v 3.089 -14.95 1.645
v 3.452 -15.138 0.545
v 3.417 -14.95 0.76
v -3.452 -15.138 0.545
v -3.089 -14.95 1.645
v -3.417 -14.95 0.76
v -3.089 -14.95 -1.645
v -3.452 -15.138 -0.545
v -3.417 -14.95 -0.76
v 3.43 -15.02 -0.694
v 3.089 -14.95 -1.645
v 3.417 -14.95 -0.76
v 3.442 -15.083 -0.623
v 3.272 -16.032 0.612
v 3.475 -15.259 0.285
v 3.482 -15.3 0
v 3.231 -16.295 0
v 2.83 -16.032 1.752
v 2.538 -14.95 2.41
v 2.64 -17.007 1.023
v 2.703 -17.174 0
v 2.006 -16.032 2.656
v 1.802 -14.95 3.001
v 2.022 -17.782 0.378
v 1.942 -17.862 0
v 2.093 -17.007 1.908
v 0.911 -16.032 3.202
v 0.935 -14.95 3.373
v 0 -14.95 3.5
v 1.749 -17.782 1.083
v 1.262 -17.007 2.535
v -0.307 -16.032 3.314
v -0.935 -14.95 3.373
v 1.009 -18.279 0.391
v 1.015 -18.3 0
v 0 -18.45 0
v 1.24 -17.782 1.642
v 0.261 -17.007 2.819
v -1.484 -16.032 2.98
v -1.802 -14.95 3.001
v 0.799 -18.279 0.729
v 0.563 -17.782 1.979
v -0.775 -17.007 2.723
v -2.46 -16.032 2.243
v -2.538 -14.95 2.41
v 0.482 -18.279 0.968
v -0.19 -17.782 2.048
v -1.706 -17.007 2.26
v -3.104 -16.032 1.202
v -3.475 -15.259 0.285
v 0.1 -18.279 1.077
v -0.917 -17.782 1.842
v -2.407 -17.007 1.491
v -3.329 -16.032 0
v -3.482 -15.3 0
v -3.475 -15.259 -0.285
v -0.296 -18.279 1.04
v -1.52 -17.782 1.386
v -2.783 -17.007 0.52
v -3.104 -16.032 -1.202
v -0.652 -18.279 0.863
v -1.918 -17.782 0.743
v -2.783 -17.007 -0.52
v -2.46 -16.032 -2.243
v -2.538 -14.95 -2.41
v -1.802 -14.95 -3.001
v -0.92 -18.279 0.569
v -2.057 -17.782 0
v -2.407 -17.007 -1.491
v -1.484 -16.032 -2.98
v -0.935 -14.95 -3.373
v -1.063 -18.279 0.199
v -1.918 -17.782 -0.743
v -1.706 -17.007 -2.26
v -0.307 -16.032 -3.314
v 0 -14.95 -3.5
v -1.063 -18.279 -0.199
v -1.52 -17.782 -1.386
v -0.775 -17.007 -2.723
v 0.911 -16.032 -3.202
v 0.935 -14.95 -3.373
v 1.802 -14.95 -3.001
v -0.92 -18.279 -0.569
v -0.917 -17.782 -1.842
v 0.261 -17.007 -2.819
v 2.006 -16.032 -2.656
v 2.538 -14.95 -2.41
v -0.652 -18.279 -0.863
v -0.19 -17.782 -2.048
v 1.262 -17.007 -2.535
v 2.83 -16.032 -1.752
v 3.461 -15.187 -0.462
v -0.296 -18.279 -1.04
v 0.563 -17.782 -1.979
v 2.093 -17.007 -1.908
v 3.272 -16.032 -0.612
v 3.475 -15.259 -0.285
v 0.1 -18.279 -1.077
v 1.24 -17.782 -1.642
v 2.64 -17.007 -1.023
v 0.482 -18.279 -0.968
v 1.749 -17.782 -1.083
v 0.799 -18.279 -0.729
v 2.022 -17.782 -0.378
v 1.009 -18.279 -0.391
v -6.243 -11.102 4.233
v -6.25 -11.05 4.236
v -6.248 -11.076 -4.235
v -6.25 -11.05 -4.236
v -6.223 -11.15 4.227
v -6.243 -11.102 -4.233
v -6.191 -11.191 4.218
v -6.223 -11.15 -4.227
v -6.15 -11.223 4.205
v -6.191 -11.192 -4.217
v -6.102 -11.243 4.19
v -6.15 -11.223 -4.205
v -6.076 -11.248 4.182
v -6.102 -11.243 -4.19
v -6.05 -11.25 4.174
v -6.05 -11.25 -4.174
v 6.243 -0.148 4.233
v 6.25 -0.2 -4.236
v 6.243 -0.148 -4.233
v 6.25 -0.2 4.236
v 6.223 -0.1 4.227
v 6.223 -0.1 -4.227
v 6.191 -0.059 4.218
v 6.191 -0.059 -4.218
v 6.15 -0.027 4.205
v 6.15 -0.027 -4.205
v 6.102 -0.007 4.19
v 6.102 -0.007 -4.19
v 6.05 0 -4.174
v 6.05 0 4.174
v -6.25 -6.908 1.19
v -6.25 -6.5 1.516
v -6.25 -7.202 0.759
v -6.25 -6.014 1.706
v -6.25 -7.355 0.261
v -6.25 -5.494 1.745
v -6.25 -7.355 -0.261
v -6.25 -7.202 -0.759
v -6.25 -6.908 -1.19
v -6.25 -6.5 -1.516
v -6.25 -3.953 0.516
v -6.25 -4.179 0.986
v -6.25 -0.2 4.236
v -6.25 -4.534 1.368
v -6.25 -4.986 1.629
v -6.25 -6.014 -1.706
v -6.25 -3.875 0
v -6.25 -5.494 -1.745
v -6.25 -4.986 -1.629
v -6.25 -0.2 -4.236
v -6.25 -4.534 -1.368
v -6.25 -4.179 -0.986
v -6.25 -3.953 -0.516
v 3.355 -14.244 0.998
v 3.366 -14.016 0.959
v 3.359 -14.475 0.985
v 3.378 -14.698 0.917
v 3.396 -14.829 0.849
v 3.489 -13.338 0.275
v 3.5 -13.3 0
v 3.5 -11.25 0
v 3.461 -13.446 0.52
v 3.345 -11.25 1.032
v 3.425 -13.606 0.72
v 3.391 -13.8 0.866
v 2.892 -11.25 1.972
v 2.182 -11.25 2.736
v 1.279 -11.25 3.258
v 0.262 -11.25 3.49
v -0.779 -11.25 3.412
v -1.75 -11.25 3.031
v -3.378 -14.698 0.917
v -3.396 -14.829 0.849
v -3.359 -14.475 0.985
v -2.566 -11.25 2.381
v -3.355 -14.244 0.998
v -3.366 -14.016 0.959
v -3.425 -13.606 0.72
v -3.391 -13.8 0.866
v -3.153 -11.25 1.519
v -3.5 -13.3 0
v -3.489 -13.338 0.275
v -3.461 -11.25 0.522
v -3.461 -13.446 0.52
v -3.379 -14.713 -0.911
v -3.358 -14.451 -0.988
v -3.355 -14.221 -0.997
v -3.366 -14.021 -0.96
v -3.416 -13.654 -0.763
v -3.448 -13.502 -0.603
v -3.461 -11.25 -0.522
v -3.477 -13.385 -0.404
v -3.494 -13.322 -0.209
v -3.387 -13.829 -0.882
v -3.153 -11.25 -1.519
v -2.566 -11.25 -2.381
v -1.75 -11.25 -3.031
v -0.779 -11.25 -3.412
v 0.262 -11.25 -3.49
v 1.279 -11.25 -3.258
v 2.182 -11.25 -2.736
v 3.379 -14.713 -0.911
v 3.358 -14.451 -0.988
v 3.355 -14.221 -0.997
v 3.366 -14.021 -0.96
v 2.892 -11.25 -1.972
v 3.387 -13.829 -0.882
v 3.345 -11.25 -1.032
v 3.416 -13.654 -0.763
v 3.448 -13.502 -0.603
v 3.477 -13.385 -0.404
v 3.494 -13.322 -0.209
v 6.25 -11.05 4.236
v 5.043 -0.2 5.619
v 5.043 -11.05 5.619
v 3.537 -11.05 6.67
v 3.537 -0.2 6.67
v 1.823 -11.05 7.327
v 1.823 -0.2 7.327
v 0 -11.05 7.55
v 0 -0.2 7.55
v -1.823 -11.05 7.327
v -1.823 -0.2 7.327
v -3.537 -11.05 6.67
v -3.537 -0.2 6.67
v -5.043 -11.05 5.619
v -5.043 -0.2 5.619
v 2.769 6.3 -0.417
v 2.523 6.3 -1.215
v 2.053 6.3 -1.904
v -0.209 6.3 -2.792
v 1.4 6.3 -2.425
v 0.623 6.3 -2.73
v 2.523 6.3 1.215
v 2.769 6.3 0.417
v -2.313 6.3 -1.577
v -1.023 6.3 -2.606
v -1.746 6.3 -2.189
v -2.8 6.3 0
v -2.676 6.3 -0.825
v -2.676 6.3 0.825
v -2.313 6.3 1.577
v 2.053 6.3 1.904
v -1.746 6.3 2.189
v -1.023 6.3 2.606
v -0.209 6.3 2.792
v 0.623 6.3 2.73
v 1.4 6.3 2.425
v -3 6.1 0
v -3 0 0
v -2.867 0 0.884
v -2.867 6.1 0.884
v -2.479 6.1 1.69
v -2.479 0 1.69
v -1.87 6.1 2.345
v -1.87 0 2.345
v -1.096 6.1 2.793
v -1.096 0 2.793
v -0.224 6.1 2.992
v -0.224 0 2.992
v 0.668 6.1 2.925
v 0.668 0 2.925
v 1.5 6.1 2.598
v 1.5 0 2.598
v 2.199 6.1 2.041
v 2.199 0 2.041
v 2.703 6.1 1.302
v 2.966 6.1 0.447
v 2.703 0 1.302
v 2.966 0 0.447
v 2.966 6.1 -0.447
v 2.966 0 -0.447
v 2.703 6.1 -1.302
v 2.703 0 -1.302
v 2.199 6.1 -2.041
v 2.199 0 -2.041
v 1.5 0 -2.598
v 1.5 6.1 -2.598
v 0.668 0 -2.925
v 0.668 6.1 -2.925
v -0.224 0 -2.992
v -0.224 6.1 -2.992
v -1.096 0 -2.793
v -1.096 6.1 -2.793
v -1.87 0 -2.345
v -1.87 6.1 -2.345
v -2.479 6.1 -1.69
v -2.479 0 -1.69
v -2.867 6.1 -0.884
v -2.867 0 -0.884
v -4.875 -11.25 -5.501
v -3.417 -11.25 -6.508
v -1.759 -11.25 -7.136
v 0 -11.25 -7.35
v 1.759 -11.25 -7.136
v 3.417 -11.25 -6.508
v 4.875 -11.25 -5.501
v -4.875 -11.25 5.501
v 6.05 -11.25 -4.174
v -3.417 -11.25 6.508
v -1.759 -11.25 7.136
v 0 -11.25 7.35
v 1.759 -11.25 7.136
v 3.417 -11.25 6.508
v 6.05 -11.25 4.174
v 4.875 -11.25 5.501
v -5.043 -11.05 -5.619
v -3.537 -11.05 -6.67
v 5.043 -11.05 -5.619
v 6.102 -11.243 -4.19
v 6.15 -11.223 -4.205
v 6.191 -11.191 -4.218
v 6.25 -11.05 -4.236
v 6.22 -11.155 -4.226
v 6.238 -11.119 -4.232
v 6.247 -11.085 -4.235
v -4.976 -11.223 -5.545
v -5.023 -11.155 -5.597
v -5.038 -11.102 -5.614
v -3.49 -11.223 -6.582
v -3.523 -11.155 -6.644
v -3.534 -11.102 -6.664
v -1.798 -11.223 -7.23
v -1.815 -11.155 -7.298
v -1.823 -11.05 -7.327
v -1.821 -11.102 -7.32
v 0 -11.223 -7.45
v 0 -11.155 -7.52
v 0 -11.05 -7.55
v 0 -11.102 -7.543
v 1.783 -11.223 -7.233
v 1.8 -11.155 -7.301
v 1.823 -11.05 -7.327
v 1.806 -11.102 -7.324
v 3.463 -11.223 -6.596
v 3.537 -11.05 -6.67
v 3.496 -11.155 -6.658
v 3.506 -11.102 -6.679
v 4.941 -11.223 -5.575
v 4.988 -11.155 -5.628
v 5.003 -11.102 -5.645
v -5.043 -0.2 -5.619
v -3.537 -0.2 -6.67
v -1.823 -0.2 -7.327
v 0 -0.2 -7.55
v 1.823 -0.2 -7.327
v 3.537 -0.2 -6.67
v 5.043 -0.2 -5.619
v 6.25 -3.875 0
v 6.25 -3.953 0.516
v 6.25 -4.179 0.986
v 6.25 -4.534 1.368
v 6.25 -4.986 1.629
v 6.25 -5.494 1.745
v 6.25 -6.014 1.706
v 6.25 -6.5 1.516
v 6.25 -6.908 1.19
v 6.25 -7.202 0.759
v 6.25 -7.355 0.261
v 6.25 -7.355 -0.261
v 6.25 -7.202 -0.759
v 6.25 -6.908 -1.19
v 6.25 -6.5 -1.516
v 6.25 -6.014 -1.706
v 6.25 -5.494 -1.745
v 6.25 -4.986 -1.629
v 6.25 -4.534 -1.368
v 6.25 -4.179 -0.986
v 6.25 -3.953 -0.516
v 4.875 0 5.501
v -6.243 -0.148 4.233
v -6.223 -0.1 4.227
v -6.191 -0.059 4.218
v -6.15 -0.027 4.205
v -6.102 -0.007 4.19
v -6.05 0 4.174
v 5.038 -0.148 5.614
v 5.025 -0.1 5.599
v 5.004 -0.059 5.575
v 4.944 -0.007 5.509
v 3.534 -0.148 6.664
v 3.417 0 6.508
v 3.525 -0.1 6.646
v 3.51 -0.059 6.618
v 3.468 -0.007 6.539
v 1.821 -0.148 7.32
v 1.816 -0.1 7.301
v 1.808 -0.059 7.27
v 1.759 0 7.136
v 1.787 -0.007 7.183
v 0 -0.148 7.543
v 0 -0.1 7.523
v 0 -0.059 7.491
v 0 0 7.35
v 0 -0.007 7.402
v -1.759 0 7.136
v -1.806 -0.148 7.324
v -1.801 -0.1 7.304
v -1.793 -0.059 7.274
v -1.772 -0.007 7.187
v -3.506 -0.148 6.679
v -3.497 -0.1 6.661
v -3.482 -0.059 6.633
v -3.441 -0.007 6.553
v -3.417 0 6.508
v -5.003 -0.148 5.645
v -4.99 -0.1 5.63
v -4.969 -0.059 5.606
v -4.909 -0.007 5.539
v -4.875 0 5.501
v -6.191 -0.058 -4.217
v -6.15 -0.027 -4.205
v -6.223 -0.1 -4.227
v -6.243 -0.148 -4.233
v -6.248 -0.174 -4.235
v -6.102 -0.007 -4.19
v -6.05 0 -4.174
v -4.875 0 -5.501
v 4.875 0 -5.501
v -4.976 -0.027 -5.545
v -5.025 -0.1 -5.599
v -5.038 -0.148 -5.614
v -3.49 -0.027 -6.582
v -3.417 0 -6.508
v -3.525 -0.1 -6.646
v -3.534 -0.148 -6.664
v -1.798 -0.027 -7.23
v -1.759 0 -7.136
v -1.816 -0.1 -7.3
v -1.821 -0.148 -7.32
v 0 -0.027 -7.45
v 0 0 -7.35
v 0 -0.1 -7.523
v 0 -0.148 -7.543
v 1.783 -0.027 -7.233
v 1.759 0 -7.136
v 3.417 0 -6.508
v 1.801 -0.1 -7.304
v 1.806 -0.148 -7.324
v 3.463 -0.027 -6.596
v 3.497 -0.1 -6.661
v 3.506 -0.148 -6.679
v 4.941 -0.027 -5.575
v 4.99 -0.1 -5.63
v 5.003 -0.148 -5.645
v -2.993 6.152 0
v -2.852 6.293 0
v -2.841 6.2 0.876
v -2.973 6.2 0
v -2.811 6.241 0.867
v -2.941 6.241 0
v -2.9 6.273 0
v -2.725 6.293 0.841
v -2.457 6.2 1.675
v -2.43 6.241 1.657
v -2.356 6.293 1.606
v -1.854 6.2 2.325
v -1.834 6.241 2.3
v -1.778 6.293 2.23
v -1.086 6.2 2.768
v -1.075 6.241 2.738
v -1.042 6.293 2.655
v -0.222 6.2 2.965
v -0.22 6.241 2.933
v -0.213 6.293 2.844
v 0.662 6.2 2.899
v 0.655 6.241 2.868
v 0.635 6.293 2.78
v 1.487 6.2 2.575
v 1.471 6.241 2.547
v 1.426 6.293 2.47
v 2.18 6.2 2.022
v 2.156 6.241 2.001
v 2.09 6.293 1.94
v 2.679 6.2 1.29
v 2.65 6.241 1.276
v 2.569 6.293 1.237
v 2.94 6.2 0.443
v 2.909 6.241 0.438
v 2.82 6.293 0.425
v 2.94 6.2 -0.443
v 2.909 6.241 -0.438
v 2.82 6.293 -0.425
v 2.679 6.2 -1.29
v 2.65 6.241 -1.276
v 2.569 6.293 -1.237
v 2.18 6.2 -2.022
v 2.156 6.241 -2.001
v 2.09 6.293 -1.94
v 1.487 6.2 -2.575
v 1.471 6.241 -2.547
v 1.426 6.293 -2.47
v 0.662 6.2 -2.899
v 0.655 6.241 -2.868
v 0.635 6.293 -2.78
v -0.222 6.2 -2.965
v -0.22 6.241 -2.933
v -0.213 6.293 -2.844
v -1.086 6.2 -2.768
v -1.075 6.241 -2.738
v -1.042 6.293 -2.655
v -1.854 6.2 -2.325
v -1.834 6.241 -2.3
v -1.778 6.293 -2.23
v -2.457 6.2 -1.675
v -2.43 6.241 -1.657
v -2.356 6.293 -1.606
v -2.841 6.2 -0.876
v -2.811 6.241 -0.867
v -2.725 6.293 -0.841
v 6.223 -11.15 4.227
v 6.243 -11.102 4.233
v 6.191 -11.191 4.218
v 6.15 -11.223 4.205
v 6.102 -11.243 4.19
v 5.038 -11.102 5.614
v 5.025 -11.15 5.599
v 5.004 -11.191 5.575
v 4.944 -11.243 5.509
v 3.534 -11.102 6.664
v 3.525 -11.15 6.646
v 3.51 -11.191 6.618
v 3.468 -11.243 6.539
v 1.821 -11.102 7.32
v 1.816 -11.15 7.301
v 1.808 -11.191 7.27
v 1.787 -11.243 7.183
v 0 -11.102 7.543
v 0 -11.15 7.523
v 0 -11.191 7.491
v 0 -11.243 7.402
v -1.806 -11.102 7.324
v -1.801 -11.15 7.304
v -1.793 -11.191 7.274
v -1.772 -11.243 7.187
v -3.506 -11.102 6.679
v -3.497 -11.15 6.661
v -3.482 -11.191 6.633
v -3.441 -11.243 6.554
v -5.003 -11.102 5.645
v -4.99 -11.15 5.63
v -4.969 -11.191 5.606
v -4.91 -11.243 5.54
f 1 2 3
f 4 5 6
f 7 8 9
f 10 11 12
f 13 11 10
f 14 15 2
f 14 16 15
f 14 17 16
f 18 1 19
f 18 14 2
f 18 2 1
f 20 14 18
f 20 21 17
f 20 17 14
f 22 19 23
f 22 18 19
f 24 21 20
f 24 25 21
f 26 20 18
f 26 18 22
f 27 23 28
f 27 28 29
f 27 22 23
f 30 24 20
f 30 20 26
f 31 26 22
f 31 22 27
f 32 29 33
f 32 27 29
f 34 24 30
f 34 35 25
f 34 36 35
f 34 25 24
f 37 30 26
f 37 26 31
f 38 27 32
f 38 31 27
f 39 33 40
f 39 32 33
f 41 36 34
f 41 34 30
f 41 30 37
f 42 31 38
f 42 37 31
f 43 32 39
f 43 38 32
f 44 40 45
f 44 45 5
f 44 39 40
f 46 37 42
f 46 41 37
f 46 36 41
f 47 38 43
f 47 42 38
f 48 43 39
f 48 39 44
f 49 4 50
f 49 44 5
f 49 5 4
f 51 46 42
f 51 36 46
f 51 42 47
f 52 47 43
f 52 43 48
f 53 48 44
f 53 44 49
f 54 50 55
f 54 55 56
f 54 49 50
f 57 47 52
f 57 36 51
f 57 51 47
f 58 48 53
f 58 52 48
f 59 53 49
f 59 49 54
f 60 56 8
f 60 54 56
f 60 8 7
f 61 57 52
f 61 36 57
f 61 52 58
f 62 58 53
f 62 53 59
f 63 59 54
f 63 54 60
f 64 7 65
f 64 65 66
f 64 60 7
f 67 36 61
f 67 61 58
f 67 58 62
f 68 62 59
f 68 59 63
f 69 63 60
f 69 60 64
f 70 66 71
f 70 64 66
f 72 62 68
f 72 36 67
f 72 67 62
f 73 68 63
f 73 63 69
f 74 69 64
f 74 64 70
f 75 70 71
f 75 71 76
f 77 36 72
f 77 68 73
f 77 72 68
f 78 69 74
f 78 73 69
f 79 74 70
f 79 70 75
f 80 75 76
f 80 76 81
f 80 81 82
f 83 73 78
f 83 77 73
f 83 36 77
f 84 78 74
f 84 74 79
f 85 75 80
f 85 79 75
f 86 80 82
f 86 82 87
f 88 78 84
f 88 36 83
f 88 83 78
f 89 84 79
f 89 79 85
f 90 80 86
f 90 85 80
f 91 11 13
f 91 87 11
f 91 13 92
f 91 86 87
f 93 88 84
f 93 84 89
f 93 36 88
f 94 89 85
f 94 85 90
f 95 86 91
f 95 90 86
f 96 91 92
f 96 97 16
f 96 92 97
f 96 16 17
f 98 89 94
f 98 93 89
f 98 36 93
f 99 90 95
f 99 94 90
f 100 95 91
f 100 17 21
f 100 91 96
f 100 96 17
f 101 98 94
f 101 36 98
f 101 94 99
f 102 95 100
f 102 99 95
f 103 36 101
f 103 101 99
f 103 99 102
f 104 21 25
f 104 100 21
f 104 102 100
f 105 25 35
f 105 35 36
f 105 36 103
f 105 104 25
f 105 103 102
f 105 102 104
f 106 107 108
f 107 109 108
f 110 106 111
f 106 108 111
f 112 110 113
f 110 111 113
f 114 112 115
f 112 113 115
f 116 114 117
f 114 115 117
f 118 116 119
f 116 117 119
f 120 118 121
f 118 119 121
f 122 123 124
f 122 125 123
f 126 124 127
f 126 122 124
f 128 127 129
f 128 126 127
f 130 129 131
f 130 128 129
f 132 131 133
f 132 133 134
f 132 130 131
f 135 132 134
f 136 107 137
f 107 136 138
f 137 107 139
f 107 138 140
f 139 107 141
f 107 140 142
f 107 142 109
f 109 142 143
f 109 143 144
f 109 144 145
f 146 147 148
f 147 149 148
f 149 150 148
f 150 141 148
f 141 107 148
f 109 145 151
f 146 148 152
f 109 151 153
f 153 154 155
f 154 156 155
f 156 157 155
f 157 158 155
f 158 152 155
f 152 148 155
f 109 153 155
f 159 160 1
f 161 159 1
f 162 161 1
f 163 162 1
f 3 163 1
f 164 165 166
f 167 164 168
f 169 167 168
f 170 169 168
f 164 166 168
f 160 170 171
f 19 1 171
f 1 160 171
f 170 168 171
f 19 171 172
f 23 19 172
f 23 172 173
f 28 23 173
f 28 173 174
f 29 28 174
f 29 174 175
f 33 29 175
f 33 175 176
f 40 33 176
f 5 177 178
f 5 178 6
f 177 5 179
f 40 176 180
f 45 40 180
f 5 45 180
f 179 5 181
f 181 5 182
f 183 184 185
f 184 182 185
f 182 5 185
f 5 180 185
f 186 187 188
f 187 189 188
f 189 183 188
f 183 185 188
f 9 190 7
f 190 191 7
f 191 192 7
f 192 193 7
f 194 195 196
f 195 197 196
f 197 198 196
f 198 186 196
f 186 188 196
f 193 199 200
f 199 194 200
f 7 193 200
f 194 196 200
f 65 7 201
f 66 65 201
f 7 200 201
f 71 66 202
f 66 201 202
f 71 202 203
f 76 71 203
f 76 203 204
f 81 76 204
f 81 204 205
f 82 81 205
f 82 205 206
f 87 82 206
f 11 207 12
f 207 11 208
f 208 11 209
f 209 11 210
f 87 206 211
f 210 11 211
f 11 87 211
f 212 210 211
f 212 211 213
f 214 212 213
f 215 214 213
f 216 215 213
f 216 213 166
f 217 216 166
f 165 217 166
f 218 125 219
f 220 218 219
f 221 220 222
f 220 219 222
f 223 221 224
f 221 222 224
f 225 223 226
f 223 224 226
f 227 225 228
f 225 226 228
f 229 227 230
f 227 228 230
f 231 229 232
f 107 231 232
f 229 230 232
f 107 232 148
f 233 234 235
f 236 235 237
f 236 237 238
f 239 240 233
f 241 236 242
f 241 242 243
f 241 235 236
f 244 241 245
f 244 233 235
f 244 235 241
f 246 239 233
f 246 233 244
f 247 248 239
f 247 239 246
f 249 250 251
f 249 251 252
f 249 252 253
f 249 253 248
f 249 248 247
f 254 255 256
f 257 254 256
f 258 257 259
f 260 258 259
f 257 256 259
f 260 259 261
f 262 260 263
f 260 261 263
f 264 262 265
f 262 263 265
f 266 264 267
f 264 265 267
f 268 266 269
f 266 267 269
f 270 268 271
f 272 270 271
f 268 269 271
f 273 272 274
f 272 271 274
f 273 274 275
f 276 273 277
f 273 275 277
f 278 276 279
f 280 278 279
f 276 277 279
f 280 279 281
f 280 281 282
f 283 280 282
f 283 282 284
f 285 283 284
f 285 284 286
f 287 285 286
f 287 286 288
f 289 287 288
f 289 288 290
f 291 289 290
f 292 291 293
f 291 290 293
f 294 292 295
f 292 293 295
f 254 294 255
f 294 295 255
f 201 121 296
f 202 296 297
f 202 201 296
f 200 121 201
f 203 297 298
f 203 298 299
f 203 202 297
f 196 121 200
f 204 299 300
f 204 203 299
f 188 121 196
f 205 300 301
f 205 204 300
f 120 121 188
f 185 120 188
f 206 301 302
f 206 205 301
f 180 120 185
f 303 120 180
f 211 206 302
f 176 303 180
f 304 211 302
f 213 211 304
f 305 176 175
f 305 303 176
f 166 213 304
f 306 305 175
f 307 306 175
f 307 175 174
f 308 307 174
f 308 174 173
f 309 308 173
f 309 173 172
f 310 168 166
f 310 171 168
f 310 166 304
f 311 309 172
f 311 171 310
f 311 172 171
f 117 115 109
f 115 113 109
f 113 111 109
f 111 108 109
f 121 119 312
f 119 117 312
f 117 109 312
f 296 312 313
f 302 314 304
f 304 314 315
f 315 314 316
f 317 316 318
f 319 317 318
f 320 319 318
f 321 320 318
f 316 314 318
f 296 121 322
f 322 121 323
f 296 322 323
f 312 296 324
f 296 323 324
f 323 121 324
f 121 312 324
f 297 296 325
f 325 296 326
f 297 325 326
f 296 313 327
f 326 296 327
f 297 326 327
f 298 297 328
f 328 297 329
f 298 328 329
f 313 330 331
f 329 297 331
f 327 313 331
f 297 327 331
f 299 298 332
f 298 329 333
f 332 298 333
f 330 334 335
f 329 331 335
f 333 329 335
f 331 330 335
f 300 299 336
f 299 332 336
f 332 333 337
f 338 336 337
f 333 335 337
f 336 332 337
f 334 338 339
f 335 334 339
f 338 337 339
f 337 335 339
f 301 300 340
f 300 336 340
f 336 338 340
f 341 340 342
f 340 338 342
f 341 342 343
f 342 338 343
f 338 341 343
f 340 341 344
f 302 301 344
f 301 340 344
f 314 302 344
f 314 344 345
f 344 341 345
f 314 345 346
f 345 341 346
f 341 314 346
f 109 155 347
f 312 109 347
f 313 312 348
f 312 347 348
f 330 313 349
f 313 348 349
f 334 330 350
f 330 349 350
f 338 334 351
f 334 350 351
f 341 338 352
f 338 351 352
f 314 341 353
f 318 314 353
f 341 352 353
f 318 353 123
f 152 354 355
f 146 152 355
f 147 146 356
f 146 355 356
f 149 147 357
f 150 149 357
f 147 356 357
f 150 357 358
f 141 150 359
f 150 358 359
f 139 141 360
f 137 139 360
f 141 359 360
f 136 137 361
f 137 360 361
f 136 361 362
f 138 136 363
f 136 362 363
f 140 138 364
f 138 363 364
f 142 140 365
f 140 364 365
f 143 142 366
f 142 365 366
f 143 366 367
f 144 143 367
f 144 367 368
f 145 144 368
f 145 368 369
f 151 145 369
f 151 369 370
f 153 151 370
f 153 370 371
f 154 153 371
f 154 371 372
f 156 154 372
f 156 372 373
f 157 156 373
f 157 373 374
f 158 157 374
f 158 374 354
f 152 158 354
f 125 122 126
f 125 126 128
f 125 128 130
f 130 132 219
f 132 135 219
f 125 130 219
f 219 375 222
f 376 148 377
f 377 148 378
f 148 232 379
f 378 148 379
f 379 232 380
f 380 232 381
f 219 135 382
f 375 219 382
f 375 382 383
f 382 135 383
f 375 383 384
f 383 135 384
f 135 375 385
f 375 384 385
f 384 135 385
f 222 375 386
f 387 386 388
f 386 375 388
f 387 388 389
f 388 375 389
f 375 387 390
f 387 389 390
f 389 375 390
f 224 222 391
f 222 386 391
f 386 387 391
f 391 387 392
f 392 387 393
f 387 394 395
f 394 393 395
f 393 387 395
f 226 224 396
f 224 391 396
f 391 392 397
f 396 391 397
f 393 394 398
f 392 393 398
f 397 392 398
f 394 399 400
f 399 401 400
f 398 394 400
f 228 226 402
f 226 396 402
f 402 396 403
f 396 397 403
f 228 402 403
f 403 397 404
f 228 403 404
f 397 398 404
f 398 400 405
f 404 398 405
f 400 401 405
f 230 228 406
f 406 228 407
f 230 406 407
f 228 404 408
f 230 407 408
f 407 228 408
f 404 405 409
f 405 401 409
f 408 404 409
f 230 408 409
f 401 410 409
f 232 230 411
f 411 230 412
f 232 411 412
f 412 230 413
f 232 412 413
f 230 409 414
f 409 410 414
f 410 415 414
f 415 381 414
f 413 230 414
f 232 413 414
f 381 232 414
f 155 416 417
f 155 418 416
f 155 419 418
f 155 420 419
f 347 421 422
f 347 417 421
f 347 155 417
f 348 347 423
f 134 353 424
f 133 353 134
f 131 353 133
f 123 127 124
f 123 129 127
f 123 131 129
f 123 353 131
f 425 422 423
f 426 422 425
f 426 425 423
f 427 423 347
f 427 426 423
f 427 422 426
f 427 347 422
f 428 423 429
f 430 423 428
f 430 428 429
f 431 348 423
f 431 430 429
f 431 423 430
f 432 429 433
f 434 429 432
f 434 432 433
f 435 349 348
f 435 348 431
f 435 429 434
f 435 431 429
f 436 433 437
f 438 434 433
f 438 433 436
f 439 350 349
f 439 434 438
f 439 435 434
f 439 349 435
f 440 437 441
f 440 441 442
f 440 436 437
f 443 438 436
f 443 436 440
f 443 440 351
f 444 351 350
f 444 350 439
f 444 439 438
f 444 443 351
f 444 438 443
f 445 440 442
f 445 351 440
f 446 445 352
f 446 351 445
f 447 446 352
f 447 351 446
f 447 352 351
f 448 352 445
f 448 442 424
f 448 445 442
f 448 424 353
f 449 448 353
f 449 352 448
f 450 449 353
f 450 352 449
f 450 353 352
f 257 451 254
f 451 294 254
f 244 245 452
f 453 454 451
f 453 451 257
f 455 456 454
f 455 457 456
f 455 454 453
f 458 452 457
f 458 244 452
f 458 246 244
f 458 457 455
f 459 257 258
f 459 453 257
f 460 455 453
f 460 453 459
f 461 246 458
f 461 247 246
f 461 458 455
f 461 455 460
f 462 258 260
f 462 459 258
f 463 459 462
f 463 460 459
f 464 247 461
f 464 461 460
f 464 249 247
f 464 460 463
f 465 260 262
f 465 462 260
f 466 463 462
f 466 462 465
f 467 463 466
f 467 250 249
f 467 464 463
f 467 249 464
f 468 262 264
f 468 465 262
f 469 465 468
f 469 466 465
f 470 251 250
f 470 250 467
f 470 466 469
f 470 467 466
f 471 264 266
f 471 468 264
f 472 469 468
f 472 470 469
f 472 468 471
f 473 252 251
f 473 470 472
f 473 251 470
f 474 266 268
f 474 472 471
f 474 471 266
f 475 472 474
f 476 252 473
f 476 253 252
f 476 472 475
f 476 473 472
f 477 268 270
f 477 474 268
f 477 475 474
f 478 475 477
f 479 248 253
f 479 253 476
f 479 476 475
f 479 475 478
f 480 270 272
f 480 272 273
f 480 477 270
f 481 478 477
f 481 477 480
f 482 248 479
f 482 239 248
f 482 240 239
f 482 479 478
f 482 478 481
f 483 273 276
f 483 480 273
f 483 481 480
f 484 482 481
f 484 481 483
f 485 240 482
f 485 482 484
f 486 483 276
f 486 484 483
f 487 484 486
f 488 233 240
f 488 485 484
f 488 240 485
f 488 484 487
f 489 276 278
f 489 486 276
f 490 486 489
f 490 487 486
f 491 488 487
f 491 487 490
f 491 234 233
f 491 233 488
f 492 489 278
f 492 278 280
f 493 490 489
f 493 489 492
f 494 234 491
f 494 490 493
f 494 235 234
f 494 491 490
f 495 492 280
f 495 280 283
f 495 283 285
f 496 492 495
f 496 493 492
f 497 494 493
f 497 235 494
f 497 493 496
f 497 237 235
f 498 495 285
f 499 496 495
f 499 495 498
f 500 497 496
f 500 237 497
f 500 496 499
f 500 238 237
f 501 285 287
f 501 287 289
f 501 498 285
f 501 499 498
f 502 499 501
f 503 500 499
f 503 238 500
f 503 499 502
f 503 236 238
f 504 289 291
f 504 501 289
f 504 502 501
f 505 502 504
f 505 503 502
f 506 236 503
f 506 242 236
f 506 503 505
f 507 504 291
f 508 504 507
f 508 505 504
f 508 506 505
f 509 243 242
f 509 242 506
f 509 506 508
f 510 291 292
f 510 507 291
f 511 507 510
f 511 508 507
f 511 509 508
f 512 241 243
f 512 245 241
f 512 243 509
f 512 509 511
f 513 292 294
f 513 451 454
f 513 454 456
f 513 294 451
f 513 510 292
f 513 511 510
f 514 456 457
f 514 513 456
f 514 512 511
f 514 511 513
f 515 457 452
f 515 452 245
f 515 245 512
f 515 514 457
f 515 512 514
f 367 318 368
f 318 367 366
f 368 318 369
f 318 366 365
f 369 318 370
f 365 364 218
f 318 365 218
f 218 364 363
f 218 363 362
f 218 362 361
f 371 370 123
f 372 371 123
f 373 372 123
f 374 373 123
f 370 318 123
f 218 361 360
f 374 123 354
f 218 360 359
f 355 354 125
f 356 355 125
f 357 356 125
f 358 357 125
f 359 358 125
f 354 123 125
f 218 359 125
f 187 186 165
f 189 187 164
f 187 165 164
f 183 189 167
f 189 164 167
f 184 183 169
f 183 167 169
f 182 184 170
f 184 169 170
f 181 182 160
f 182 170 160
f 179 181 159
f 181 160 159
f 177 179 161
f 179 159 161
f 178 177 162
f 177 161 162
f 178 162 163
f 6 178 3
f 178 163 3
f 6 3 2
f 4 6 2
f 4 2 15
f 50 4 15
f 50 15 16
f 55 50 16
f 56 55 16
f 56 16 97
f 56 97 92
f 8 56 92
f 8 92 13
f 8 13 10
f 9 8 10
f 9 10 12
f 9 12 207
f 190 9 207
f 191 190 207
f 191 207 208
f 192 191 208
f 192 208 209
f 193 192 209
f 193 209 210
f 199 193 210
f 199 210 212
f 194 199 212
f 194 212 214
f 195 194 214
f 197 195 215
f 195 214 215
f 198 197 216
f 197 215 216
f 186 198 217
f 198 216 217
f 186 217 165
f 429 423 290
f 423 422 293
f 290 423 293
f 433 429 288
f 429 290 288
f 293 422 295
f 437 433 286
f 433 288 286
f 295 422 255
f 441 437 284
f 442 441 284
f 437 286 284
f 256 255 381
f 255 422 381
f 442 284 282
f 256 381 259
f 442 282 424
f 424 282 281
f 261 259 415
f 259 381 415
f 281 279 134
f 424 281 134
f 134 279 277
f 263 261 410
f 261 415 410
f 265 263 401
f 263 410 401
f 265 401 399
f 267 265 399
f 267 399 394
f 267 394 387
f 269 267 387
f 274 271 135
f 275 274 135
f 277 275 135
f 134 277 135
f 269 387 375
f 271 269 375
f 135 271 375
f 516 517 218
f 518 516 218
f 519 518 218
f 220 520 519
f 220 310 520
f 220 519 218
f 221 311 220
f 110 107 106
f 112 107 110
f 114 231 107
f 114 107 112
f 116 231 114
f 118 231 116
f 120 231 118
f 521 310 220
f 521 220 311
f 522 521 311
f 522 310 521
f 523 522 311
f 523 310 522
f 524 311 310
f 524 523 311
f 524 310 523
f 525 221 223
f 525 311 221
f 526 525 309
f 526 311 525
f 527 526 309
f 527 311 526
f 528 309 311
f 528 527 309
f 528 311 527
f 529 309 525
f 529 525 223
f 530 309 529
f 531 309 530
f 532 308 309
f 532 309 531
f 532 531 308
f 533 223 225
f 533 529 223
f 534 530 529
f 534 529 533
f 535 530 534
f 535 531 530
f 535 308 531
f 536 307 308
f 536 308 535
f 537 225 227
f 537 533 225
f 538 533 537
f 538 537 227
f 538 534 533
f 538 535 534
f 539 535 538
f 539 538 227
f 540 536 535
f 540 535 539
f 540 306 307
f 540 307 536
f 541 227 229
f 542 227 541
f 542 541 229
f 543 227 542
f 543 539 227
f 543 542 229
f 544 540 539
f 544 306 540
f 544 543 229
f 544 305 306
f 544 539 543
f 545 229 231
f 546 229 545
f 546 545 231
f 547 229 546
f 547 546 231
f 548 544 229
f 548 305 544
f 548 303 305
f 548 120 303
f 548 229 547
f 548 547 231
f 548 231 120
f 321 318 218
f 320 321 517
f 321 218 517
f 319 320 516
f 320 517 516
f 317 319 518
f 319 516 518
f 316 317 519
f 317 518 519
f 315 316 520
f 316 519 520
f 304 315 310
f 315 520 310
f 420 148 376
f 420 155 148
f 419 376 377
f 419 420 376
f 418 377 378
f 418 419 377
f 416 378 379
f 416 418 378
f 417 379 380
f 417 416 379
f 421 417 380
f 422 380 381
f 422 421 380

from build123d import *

# Parameters (mm, degrees)
F1_DEPTH = 11.25
F2_R     = 1.75
F3_DEPTH = 15
F4_R     = 3
F5_DEPTH = 6.3
F6_R     = 3.5
F7_DEPTH = 7.2
F8_R     = 1
F9_DEPTH = 15
F11_R    = 0.2


# Not quite as in the source:
# - a fillet or chamfer that OpenCascade refuses, or shapes differently, is made with other operations: its cross-section is extruded or revolved along the edge and cut away or added


with BuildPart() as f1:
    # F0 (on Front) → F1 (new body)
    with BuildSketch(Plane.XZ):
        with BuildLine():
            Line((6.25, 0), (6.25, 4.2355637169))
            ThreePointArc((6.25, 4.2355637169), (0, 7.55), (-6.25, 4.2355637169))
            Line((-6.25, 4.2355637169), (-6.25, -4.2355637169))
            ThreePointArc((-6.25, -4.2355637169), (0, -7.55), (6.25, -4.2355637169))
            Line((6.25, -4.2355637169), (6.25, 0))
        make_face()
    extrude(amount=F1_DEPTH)

    # F2 (on face) → F3 (cut)
    with BuildSketch(Plane.YZ.offset(6.25)):
        with Locations((-5.625, 0)):
            Circle(F2_R)
    extrude(amount=-F3_DEPTH, mode=Mode.SUBTRACT)

    # F4 (on face) → F5 (join)
    with BuildSketch(Plane(origin=(0, 0, 0), x_dir=(-1, 0, 0), z_dir=(0, 1, 0))):
        Circle(F4_R)
    extrude(amount=F5_DEPTH)

    # F6 (on face) → F7 (join)
    with BuildSketch(Plane.XZ.offset(11.25)):
        Circle(F6_R)
    extrude(amount=F7_DEPTH)

    # F8 (on face) → F9 (cut)
    with BuildSketch(Plane.YZ.offset(6.25)):
        with Locations((-14.3, 0)):
            Circle(F8_R)
    extrude(amount=-F9_DEPTH, mode=Mode.SUBTRACT)

    # F10: fillet of radius 3.5 on 1 edges, made by hand

    # F10_s1 → F10_t2 (revolve, cut)
    with BuildSketch(Plane.XY):
        with BuildLine():
            ThreePointArc((3.5, -14.95), (2.4748737342, -17.4248737342), (0, -18.45))
            Line((0, -18.45), (3.5, -18.45))
            Line((3.5, -18.45), (3.5, -14.95))
        make_face()
    revolve(axis=Axis((0, -18.45, 0), (0, -1, 0)), mode=Mode.SUBTRACT)

    # F11
    f11_edges = [f1.edges().sort_by_distance(p)[0] for p in [
        (3, 6.3, 0),
        (0, 0, 7.55),
        (6.25, 0, 0),
        (0, 0, -7.55),
        (-6.25, 0, 0),
        (0, -11.25, 7.55),
        (0, -11.25, -7.55),
        (-6.25, -11.25, 0),
        (6.25, -11.25, 0),
    ]]
    fillet(f11_edges, radius=F11_R)


solid = f1.part
